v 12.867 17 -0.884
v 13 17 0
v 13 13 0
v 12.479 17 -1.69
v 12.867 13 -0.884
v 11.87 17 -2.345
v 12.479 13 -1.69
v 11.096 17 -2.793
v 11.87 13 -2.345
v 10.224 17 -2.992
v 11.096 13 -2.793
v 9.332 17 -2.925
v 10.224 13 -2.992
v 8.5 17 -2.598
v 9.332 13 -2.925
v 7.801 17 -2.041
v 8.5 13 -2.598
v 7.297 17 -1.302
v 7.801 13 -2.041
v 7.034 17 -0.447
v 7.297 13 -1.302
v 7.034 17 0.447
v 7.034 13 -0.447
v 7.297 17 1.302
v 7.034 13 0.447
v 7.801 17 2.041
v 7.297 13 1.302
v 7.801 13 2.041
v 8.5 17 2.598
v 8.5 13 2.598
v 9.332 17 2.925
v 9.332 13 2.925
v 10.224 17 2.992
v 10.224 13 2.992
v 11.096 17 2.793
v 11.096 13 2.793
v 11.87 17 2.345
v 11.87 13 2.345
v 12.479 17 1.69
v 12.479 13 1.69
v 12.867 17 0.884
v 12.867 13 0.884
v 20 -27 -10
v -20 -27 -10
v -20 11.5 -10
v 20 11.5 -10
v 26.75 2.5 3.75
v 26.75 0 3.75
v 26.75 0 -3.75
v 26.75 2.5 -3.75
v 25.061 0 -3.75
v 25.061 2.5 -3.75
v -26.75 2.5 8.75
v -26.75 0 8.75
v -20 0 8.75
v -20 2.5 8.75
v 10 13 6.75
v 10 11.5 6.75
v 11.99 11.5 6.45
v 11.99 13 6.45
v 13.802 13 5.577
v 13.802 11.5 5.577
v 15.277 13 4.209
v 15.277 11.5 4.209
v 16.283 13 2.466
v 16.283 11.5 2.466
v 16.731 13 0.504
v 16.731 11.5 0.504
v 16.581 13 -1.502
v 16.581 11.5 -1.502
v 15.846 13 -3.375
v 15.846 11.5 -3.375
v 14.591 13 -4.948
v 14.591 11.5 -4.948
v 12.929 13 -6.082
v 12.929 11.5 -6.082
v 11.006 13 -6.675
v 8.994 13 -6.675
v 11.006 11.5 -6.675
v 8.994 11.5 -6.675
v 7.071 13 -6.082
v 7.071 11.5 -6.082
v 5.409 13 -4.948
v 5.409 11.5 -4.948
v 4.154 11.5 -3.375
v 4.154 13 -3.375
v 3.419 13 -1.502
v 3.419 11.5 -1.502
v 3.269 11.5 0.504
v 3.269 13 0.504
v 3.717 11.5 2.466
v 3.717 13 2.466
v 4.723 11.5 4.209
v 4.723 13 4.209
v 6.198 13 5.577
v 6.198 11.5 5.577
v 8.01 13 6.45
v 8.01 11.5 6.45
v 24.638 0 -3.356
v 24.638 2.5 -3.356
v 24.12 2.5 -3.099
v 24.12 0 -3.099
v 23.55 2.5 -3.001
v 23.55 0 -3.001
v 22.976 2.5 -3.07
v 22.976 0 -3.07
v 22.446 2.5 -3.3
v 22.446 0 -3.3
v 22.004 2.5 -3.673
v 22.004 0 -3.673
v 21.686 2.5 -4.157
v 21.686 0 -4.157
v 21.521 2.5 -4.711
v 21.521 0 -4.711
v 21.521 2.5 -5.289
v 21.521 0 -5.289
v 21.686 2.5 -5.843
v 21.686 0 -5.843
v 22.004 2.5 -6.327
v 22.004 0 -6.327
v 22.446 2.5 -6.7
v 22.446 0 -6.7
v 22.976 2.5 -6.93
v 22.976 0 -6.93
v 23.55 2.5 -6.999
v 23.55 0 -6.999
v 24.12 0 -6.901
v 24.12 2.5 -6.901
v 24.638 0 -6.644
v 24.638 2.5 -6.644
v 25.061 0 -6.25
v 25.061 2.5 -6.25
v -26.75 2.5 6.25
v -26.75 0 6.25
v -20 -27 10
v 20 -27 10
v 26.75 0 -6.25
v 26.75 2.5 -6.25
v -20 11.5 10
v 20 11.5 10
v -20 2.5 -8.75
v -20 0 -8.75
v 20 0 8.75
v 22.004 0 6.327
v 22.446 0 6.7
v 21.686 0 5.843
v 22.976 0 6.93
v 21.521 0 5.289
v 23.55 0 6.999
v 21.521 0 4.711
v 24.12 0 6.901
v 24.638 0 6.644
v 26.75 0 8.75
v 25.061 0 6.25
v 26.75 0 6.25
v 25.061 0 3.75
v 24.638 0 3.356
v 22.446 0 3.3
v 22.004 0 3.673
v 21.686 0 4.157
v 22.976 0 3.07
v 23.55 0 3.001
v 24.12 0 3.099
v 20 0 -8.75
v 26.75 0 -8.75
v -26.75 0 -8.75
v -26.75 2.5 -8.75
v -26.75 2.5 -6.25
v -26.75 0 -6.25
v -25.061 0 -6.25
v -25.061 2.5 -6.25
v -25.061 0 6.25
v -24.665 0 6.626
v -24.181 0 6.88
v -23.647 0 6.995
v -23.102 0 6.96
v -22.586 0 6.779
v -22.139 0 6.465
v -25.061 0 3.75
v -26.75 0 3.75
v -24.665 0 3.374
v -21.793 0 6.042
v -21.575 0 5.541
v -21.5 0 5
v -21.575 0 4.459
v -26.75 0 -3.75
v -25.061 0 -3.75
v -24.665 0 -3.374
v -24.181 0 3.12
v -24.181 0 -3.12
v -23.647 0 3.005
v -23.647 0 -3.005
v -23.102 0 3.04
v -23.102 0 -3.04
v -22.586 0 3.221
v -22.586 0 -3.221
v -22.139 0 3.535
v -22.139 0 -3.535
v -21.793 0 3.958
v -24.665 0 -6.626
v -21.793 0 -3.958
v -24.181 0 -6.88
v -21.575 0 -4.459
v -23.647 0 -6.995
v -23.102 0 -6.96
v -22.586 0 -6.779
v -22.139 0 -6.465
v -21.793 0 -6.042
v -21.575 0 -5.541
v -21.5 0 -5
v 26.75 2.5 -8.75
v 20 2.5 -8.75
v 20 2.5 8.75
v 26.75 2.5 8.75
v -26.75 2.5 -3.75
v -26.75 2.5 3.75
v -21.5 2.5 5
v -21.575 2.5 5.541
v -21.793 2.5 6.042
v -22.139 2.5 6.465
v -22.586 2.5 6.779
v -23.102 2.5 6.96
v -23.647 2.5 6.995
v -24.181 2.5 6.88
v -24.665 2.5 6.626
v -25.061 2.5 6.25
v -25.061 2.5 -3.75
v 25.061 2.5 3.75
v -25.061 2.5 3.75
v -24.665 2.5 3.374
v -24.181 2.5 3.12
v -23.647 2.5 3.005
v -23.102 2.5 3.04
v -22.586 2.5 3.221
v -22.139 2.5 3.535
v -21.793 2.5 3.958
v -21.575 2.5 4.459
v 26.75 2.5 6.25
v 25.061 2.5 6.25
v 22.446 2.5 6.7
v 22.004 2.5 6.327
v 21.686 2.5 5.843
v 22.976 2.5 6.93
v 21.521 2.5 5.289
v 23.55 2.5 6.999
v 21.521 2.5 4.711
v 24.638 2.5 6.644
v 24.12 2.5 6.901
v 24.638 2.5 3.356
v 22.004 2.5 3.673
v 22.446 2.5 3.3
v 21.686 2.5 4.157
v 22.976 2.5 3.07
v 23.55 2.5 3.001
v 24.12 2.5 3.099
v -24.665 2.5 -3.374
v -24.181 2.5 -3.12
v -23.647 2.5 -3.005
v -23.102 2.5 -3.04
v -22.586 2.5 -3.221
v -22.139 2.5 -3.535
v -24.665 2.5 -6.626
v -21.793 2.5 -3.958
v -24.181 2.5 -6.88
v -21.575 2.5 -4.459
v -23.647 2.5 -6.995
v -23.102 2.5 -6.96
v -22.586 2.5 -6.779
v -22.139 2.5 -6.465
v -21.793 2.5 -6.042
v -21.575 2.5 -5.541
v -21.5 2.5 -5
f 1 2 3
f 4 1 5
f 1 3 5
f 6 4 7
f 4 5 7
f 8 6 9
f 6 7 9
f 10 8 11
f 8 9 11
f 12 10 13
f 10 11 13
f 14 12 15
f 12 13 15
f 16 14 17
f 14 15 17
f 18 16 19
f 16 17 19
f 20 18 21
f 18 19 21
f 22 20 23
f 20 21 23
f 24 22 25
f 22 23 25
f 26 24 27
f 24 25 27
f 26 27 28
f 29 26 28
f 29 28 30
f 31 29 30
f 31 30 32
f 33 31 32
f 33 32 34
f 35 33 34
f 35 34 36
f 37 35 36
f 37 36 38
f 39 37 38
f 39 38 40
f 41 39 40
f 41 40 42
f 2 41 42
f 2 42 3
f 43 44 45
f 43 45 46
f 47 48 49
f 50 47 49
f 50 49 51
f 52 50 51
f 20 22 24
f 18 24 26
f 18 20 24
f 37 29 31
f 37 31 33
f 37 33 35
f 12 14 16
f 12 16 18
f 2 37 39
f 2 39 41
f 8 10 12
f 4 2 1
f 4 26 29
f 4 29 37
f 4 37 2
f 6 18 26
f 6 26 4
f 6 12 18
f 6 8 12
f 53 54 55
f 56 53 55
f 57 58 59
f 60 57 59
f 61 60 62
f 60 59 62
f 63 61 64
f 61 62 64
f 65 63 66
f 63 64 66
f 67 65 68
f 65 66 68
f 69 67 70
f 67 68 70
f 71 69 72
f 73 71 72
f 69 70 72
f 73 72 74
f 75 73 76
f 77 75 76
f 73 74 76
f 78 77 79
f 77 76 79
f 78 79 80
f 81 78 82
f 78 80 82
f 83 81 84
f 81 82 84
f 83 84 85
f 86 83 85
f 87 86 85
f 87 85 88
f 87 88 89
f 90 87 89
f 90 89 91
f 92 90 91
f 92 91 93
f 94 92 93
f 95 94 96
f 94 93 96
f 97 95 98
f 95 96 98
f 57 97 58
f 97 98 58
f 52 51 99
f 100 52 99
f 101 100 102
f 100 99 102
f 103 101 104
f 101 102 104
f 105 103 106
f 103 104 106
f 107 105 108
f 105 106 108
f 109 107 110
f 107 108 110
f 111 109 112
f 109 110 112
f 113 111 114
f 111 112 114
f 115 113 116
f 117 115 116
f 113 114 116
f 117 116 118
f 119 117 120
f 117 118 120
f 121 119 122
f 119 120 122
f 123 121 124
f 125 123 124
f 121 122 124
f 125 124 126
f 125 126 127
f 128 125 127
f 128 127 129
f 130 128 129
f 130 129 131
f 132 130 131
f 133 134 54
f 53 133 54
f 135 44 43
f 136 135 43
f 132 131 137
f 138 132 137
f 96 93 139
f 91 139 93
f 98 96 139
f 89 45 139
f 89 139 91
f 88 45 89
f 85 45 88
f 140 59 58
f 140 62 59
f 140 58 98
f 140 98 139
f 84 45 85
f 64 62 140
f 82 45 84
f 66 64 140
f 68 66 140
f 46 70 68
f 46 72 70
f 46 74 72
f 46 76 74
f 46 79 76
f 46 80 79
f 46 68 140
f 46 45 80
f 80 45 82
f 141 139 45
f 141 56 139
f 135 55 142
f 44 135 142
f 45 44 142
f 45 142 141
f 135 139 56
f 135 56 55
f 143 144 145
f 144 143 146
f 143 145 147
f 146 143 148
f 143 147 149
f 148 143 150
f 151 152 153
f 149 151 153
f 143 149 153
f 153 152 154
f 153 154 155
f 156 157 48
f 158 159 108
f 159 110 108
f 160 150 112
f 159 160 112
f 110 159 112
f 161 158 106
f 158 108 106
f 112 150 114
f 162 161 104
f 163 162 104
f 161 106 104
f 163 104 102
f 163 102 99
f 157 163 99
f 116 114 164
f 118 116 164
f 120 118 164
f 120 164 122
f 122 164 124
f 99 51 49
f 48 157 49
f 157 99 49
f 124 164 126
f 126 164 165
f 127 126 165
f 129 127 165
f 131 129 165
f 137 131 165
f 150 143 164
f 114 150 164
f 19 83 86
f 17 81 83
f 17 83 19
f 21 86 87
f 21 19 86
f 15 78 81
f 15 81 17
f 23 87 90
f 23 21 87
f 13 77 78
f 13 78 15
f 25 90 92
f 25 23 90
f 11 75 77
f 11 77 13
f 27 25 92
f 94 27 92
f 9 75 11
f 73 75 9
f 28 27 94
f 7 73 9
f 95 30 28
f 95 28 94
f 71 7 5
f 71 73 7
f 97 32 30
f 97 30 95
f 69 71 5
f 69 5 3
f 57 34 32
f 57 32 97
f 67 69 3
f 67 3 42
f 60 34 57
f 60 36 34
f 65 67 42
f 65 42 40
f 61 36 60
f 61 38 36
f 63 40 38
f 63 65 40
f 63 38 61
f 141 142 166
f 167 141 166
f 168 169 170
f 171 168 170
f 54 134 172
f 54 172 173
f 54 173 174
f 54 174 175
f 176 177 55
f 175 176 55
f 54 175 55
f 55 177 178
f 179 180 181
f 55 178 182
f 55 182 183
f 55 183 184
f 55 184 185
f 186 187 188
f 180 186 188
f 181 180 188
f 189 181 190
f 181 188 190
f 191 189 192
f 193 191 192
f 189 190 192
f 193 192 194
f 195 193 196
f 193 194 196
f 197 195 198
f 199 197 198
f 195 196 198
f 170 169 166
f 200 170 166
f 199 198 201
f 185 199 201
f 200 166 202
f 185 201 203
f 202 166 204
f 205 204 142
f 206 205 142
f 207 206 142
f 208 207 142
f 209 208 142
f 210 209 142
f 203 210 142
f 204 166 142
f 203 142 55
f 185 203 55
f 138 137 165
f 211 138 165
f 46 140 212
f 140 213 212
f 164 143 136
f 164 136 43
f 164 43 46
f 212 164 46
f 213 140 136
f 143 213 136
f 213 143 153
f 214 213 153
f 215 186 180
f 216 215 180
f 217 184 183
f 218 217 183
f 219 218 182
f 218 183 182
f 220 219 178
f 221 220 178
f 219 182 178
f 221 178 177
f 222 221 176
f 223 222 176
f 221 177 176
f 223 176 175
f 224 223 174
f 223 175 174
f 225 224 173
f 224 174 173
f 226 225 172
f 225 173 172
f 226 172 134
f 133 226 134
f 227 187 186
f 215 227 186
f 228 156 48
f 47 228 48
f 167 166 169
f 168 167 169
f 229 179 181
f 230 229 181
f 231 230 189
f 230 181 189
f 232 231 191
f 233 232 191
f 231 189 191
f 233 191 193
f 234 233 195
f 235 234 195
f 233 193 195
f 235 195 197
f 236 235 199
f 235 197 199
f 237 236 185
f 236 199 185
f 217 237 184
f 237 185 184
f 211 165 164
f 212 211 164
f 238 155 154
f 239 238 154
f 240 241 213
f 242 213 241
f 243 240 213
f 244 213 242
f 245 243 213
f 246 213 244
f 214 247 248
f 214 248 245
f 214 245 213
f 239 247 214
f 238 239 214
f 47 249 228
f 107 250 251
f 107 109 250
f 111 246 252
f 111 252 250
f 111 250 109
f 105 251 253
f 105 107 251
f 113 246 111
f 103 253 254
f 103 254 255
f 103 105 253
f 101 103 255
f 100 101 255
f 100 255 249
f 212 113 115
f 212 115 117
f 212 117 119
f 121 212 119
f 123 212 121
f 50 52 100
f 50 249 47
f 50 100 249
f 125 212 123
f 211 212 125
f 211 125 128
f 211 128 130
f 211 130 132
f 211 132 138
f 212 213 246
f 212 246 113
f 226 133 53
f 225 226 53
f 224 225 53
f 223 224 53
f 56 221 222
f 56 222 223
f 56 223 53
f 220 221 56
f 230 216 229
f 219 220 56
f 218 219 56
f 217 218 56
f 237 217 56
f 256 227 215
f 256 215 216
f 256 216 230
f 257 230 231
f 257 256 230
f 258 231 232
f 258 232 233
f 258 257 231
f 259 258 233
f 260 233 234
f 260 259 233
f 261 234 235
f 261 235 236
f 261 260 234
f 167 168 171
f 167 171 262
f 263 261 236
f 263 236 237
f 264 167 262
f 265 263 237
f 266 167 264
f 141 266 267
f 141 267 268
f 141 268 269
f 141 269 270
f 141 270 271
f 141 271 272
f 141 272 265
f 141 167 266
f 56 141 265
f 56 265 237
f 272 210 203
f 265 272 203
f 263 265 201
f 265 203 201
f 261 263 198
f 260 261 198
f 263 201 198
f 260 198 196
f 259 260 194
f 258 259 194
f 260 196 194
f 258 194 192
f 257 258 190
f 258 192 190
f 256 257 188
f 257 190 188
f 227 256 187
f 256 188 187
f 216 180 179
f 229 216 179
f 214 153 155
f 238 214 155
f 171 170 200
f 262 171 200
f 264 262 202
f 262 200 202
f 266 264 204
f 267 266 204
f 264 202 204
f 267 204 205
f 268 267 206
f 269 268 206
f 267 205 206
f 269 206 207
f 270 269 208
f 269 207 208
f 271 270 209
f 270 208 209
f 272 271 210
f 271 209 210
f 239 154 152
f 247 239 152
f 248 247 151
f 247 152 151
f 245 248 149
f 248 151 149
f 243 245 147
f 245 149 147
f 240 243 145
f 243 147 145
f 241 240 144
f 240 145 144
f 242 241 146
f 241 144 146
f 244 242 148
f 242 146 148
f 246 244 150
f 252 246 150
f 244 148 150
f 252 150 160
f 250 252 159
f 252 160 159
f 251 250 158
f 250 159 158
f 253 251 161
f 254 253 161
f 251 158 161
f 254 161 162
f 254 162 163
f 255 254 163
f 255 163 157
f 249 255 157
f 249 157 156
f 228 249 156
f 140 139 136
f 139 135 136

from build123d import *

# Parameters (mm, degrees)
EXTRUDE_1_DEPTH   = 2.5
EXTRUDE_1_2_DEPTH = 2.5
EXTRUDE_4_DEPTH   = 27
EXTRUDE_5_DEPTH   = 11.5
SKETCH_2_R        = 3
EXTRUDE_6_DEPTH   = 5.5
SKETCH_2_3_R      = 6.75
SKETCH_2_3_R_2    = 3
EXTRUDE_7_DEPTH   = 1.5


with BuildPart() as part:
    # Эскиз1 → Бобышка-Вытянуть1 (new body)
    with BuildSketch(Plane(origin=(0, 0, 0), x_dir=(1, 0, 0), z_dir=(0, 1, 0))):
        with BuildLine():
            Line((-20, -8.75), (-20, 8.75))
            Line((-20, 8.75), (-26.75, 8.75))
            Line((-26.75, 8.75), (-26.75, 6.25))
            Line((-26.75, 6.25), (-25.0612495, 6.25))
            ThreePointArc((-25.0612495, 6.25), (-21.5, 5), (-25.0612495, 3.75))
            Line((-25.0612495, 3.75), (-26.75, 3.75))
            Line((-26.75, 3.75), (-26.75, -3.75))
            Line((-26.75, -3.75), (-25.0612495, -3.75))
            ThreePointArc((-25.0612495, -3.75), (-21.5, -5), (-25.0612495, -6.25))
            Line((-25.0612495, -6.25), (-26.75, -6.25))
            Line((-26.75, -6.25), (-26.75, -8.75))
            Line((-26.75, -8.75), (-20, -8.75))
        make_face()
    extrude(amount=EXTRUDE_1_DEPTH)



with BuildPart() as body_2:
    # Эскиз1 → Extrude 1 2 (new body)
    with BuildSketch(Plane(origin=(0, 0, 0), x_dir=(1, 0, 0), z_dir=(0, 1, 0))):
        with BuildLine():
            Line((26.75, 8.75), (20, 8.75))
            Line((20, 8.75), (20, -8.75))
            Line((20, -8.75), (26.75, -8.75))
            Line((26.75, -8.75), (26.75, -6.25))
            Line((26.75, -6.25), (25.0612495, -6.25))
            ThreePointArc((25.0612495, -6.25), (21.5, -5), (25.0612495, -3.75))
            Line((25.0612495, -3.75), (26.75, -3.75))
            Line((26.75, -3.75), (26.75, 3.75))
            Line((26.75, 3.75), (25.0612495, 3.75))
            ThreePointArc((25.0612495, 3.75), (21.5, 5), (25.0612495, 6.25))
            Line((25.0612495, 6.25), (26.75, 6.25))
            Line((26.75, 6.25), (26.75, 8.75))
        make_face()
    extrude(amount=EXTRUDE_1_2_DEPTH)


with BuildPart() as body_3:
    # Эскиз1<7> → Бобышка-Вытянуть4 (new body)
    with BuildSketch(Plane(origin=(0, 0, 0), x_dir=(1, 0, 0), z_dir=(0, 1, 0))):
        Polygon((20, 10), (-20, 10), (-20, 8.75), (-20, -8.75), (-20, -10), (20, -10), (20, -8.75), (20, 8.75), align=None)
    extrude(amount=-EXTRUDE_4_DEPTH)


with BuildPart() as part_1:
    add(part.part)

    add(body_2.part)  # Бобышка-Вытянуть5 merges body 2

    add(body_3.part)  # Бобышка-Вытянуть5 merges body 3
    # Эскиз1<8> → Бобышка-Вытянуть5 (add)
    with BuildSketch(Plane(origin=(0, 0, 0), x_dir=(1, 0, 0), z_dir=(0, 1, 0))):
        Polygon((20, 10), (-20, 10), (-20, 8.75), (-20, -8.75), (-20, -10), (20, -10), (20, -8.75), (20, 8.75), align=None)
    extrude(amount=EXTRUDE_5_DEPTH)

    # Эскиз2 → Бобышка-Вытянуть6 (add)
    with BuildSketch(Plane(origin=(0, 11.5, 0), x_dir=(1, 0, 0), z_dir=(0, 1, 0))):
        with Locations((10, 0)):
            Circle(SKETCH_2_R)
    extrude(amount=EXTRUDE_6_DEPTH)

    # Эскиз2<3> → Бобышка-Вытянуть7 (add)
    with BuildSketch(Plane(origin=(0, 11.5, 0), x_dir=(1, 0, 0), z_dir=(0, 1, 0))):
        with Locations((10, 0)):
            Circle(SKETCH_2_3_R)
        with Locations((10, 0)):
            Circle(SKETCH_2_3_R_2, mode=Mode.SUBTRACT)
    extrude(amount=EXTRUDE_7_DEPTH)


solid = part_1.part
